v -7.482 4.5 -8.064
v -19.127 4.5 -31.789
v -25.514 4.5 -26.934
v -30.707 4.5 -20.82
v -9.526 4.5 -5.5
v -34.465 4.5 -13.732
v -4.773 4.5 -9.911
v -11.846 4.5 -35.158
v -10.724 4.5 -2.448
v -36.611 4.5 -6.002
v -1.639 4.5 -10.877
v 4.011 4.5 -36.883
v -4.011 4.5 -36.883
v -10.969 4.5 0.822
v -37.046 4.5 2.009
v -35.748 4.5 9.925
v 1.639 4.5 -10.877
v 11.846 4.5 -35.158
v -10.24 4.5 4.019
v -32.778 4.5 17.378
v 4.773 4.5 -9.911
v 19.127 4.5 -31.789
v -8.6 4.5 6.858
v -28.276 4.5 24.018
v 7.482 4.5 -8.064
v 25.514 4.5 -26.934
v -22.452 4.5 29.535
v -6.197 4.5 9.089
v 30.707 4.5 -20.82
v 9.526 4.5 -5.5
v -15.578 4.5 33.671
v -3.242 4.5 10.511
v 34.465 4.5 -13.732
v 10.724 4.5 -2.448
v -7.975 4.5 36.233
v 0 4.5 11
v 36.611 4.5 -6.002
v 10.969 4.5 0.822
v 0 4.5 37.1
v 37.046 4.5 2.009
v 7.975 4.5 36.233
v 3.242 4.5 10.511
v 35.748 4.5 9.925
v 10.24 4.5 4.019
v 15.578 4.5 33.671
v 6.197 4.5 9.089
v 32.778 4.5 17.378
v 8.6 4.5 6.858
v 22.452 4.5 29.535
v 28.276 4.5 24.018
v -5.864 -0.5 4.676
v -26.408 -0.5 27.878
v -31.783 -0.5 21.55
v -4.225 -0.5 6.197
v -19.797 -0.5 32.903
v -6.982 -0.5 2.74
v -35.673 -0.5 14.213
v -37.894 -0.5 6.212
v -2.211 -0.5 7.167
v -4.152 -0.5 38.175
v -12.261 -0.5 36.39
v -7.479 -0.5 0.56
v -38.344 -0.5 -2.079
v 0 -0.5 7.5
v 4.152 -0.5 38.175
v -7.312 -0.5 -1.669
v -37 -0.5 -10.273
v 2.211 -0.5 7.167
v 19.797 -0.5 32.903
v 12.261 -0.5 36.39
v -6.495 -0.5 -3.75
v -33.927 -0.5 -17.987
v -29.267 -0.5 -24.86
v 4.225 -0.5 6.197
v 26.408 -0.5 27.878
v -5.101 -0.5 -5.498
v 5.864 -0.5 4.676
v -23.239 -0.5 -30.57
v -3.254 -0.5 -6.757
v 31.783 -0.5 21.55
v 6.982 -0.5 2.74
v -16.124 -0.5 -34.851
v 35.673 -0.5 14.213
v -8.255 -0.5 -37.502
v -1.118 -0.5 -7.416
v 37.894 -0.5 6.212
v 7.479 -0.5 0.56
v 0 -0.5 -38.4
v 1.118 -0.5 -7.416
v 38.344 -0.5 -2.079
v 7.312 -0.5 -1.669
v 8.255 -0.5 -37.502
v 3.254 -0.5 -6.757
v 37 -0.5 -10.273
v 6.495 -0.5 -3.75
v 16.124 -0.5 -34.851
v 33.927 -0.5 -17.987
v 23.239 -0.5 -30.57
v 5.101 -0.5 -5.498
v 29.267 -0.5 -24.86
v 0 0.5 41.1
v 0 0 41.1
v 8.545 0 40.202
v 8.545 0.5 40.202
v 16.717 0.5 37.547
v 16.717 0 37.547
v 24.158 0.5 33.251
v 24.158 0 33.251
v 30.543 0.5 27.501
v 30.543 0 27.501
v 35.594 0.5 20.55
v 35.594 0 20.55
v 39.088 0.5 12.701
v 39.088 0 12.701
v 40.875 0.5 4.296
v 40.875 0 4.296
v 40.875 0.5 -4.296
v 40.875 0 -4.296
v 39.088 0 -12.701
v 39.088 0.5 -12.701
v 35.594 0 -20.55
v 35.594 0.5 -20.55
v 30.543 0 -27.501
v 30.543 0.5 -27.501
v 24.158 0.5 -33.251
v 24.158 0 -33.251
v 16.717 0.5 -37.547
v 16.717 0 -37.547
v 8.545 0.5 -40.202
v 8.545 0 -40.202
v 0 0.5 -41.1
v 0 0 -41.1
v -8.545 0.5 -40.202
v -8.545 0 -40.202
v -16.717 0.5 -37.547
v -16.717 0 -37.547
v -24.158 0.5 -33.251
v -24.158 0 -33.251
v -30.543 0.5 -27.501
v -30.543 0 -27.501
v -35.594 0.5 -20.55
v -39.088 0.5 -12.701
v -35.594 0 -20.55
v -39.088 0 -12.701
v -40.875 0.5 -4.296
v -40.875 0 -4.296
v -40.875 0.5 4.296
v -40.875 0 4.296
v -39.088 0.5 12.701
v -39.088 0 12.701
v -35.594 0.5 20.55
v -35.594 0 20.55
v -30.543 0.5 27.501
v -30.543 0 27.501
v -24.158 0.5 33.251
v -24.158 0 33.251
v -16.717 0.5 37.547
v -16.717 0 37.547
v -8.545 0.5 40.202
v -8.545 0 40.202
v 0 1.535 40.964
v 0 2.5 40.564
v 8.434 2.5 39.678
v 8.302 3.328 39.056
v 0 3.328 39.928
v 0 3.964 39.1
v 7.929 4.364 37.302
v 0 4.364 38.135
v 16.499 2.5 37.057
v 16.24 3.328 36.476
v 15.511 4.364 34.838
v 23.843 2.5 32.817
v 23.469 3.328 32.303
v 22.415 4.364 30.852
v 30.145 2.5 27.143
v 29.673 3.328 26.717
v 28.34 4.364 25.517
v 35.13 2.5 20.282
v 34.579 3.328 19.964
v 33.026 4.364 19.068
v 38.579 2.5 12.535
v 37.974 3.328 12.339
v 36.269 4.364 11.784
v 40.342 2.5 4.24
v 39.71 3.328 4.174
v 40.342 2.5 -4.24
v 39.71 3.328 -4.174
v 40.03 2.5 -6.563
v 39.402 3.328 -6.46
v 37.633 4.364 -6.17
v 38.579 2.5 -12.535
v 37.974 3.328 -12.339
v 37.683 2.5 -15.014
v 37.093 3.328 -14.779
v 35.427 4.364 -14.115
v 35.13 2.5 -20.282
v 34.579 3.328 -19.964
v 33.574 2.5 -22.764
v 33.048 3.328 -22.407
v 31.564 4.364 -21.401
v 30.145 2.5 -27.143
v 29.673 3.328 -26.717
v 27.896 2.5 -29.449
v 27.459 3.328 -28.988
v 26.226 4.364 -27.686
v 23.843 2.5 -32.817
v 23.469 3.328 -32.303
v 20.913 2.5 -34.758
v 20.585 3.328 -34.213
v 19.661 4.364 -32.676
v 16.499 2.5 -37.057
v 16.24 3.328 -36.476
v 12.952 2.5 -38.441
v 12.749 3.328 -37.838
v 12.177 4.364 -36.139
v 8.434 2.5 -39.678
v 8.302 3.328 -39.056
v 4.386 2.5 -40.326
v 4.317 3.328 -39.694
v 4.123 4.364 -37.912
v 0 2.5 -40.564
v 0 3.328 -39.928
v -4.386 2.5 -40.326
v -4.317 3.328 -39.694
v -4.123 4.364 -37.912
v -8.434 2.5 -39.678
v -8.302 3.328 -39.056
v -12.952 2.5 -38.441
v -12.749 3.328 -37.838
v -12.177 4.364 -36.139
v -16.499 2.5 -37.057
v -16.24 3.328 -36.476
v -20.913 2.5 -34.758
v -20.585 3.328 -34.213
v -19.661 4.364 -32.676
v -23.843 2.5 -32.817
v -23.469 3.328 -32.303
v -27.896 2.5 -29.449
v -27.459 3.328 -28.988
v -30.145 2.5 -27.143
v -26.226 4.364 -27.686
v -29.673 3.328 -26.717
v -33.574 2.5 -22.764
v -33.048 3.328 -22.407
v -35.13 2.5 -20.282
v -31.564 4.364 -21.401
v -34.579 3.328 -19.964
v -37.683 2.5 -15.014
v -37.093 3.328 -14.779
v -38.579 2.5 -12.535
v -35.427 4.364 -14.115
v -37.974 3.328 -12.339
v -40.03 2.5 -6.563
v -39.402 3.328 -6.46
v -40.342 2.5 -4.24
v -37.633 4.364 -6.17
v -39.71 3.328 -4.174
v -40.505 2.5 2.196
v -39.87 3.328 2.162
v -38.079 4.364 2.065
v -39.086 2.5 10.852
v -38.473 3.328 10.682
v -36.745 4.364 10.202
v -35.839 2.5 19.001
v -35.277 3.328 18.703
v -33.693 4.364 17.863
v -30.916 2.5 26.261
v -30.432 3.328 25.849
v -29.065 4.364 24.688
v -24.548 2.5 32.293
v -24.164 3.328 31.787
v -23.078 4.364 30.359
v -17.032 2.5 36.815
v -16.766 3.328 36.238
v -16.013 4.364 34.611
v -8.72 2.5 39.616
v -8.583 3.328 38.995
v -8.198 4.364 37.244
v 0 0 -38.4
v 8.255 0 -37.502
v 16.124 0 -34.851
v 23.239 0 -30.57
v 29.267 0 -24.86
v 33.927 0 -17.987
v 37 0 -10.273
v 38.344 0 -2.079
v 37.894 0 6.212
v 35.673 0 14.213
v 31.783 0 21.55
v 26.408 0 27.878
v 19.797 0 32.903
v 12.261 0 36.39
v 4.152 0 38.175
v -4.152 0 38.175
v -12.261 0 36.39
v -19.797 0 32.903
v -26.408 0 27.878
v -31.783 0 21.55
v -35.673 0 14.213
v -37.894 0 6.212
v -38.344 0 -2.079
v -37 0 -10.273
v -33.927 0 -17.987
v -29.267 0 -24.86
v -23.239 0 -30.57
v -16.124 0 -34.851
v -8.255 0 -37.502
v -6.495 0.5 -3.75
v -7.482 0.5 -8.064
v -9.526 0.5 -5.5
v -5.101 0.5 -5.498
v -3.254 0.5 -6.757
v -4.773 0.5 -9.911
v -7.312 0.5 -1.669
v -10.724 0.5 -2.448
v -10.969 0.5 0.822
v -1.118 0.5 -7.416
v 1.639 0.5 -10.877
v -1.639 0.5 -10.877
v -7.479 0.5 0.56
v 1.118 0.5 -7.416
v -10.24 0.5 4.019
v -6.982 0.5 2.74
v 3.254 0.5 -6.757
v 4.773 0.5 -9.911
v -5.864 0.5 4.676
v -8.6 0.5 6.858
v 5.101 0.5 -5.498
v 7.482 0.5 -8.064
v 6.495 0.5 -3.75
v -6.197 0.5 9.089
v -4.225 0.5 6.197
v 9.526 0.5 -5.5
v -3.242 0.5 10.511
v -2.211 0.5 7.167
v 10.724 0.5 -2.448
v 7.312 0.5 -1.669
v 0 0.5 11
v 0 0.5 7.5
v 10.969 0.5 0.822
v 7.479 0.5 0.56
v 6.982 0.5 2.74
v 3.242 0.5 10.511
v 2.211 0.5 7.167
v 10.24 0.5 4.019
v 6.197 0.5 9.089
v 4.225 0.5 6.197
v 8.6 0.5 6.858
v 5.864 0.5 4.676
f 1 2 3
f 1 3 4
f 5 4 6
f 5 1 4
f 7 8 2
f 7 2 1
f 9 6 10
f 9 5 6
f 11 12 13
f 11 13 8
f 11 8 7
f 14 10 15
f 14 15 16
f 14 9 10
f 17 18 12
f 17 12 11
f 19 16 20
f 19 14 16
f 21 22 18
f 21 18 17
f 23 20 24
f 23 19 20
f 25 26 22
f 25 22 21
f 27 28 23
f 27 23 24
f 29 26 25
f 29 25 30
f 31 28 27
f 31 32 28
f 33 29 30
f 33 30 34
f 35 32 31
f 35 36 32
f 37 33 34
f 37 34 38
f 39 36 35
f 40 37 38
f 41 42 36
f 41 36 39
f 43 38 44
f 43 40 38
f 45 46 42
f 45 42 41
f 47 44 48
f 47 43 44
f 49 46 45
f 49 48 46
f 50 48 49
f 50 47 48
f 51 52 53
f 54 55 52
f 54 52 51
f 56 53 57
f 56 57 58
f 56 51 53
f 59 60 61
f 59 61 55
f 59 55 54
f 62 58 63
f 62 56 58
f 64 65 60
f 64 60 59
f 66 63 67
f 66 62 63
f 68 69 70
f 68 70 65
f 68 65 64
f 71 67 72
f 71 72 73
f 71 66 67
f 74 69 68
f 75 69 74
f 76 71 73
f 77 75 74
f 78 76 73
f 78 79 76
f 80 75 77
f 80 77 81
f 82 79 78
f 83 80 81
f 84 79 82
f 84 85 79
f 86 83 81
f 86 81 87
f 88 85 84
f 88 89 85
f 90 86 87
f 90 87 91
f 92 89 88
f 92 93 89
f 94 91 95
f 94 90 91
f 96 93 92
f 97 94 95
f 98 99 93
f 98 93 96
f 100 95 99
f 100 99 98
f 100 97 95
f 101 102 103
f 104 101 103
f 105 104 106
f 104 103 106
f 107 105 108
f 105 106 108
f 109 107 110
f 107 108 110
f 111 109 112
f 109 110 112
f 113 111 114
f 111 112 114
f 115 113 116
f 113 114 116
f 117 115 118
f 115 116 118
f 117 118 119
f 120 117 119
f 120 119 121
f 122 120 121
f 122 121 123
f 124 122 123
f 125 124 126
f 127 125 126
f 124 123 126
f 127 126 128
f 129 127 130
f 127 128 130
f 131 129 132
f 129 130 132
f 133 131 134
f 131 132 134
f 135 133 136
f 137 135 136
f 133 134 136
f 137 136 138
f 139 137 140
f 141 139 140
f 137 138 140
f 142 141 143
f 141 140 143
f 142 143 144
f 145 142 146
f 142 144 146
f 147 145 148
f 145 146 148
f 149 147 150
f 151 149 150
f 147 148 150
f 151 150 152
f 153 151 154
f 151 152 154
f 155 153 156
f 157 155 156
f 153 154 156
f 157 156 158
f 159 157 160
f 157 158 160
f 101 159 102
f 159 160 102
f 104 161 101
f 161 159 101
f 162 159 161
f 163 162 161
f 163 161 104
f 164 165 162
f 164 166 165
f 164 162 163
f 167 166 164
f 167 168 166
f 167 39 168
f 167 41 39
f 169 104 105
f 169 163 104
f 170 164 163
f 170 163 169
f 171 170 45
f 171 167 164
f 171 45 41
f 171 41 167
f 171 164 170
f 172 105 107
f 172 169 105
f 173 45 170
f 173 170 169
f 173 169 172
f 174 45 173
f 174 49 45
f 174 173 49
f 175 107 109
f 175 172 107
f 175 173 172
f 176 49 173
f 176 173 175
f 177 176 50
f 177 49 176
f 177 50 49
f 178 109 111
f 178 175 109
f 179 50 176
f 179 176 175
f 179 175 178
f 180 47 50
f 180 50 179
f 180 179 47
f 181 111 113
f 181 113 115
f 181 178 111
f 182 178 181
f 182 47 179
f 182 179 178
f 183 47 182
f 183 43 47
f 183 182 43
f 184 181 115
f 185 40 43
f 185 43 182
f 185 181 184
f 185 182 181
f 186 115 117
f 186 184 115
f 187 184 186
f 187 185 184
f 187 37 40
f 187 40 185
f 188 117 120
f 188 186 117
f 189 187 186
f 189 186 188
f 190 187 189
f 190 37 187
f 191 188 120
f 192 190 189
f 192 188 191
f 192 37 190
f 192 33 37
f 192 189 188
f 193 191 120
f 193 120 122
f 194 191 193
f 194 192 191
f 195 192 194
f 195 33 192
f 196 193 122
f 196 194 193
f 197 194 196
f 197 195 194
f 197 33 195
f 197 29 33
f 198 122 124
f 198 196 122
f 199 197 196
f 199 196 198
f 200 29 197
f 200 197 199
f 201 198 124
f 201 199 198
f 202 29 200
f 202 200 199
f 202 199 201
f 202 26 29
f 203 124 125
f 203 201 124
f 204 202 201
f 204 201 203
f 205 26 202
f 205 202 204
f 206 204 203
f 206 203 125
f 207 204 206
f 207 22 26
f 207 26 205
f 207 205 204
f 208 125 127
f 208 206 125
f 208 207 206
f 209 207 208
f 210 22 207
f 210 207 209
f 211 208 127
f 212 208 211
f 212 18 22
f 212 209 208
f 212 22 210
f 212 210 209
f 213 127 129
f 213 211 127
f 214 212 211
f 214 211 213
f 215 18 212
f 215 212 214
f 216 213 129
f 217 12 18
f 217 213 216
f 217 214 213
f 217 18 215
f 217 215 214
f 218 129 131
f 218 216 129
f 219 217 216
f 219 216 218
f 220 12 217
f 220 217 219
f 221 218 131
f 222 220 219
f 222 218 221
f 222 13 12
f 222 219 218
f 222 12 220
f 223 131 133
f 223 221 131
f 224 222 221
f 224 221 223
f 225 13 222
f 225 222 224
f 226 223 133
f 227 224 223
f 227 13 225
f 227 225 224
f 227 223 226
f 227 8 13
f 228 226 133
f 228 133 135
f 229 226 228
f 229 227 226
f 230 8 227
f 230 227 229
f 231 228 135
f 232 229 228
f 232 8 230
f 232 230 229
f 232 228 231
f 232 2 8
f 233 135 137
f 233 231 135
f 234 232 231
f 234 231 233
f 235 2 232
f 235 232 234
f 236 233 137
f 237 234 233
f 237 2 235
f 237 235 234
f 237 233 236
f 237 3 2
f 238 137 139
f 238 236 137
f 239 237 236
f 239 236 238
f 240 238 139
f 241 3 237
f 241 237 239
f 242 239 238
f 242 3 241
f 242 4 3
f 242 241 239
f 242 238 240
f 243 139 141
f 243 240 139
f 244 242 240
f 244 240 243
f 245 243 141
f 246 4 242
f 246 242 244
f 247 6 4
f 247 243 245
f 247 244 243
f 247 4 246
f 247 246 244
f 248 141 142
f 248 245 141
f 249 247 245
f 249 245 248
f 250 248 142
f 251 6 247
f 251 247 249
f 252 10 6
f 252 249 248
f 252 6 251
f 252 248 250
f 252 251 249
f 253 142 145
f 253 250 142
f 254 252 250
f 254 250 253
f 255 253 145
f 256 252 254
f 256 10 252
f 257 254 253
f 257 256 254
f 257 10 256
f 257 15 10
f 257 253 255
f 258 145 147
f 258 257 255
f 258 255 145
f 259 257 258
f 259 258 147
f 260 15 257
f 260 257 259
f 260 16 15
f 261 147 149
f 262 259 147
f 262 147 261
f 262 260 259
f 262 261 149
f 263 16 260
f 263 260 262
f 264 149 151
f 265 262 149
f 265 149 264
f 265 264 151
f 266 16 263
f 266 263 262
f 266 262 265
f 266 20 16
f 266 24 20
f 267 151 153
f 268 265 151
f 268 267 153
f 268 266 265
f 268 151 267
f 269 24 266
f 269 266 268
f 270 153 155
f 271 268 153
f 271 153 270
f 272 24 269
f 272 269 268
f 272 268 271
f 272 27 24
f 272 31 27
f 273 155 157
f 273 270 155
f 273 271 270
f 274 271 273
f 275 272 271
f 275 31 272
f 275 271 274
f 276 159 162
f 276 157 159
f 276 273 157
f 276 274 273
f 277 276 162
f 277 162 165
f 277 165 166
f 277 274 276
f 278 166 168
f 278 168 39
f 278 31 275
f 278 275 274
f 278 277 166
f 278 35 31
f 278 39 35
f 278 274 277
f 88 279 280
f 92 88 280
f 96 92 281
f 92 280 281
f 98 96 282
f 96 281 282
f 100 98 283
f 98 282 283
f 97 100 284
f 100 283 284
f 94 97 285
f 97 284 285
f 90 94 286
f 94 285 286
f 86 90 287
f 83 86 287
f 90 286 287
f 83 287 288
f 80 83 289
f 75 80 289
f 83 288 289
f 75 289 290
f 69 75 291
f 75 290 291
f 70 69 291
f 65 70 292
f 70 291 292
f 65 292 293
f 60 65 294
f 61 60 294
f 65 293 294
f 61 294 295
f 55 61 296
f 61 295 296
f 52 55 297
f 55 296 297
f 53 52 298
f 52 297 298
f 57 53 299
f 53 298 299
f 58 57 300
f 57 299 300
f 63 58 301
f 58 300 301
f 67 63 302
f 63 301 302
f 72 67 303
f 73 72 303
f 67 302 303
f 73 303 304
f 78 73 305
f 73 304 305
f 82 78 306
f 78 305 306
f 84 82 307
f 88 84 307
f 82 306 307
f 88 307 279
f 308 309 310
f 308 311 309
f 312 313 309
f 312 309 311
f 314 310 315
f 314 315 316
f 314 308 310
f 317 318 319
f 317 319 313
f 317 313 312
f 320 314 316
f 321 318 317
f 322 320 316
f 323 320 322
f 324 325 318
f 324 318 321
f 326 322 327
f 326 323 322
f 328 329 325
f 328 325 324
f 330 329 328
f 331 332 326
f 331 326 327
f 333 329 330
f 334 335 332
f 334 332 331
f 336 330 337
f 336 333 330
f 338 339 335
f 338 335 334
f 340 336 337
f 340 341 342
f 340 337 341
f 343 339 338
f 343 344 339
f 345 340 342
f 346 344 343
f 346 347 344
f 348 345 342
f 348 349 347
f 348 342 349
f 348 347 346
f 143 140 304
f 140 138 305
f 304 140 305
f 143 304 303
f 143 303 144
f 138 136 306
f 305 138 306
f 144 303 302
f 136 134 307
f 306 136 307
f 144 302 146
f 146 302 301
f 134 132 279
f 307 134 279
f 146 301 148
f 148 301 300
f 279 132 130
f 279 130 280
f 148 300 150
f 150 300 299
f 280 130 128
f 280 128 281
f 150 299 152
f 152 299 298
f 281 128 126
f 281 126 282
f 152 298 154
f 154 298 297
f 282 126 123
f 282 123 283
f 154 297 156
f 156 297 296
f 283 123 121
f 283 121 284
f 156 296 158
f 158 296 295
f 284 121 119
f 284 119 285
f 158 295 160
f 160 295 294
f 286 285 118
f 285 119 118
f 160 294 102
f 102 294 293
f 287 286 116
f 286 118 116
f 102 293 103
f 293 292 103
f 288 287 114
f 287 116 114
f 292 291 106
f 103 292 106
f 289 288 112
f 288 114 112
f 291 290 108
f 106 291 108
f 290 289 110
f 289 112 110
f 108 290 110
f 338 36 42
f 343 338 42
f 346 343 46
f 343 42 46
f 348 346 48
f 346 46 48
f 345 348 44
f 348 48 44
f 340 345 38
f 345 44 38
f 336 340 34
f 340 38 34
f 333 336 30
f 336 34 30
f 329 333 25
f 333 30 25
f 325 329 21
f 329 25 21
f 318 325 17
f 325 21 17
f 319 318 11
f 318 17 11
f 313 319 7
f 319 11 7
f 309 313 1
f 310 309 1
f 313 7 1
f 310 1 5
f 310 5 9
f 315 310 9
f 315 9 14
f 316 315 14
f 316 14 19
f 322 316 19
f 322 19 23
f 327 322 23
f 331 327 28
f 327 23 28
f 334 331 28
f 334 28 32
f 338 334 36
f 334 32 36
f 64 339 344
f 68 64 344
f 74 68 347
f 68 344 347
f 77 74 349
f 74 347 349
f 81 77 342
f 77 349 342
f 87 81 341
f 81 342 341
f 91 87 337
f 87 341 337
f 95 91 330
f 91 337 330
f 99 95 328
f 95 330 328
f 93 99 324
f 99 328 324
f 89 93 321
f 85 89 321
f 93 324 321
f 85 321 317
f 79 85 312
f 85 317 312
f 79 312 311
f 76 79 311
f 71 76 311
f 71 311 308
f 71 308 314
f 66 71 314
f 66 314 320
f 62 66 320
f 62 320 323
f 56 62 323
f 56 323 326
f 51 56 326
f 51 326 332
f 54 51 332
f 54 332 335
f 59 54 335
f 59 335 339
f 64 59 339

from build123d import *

# Parameters (mm, degrees)
SKETCH1_R           = 41.1
BOSS_EXTRUDE1_DEPTH = 4.5
SKETCH5_R           = 38.4
BOSS_EXTRUDE3_DEPTH = 0.5
SKETCH2_R           = 11
SKETCH2_R_2         = 4.5
CUT_EXTRUDE1_DEPTH  = 4
SKETCH3_R           = 7.5
CUT_EXTRUDE2_DEPTH  = 59.261651195
FILLET1_R           = 4


with BuildPart() as part:
    # Sketch1 → Boss-Extrude1 (new body)
    with BuildSketch(Plane(origin=(0, 0, 0), x_dir=(1, 0, 0), z_dir=(0, 1, 0))):
        with Locations(Location((0, 0, 0), (0, 0, 270))):
            Circle(SKETCH1_R)
    extrude(amount=BOSS_EXTRUDE1_DEPTH)

    # Sketch5 → Boss-Extrude3 (add)
    with BuildSketch(Plane.XZ):
        with Locations(Location((0, 0, 0), (0, 0, 270))):
            Circle(SKETCH5_R)
    extrude(amount=BOSS_EXTRUDE3_DEPTH)

    # Sketch2 → Cut-Extrude1 (cut)
    # profile 1 of 2: a face of its own
    with BuildSketch(Plane(origin=(0, 4.5, 0), x_dir=(1, 0, 0), z_dir=(0, 1, 0))):
        with Locations(Location((0, 0, 0), (0, 0, 270))):
            Circle(SKETCH2_R)
        Circle(SKETCH2_R_2, mode=Mode.SUBTRACT)
    # profile 2 of 2: a face of its own
    with BuildSketch(Plane(origin=(0, 4.5, 0), x_dir=(1, 0, 0), z_dir=(0, 1, 0))):
        Circle(SKETCH2_R_2)
    extrude(amount=-CUT_EXTRUDE1_DEPTH, mode=Mode.SUBTRACT)

    # Sketch3 → Cut-Extrude2 (cut, through all)
    with BuildSketch(Plane(origin=(0, 0.5, 0), x_dir=(1, 0, 0), z_dir=(0, 1, 0))):
        with Locations(Location((0, 0, 0), (0, 0, 270))):
            Circle(SKETCH3_R)
    extrude(amount=-CUT_EXTRUDE2_DEPTH, mode=Mode.SUBTRACT)

    # Fillet1
    fillet1_edges = [part.edges().sort_by_distance(p)[0] for p in [
        (0, 4.5, -41.1),
    ]]
    fillet(fillet1_edges, radius=FILLET1_R)


solid = part.part
